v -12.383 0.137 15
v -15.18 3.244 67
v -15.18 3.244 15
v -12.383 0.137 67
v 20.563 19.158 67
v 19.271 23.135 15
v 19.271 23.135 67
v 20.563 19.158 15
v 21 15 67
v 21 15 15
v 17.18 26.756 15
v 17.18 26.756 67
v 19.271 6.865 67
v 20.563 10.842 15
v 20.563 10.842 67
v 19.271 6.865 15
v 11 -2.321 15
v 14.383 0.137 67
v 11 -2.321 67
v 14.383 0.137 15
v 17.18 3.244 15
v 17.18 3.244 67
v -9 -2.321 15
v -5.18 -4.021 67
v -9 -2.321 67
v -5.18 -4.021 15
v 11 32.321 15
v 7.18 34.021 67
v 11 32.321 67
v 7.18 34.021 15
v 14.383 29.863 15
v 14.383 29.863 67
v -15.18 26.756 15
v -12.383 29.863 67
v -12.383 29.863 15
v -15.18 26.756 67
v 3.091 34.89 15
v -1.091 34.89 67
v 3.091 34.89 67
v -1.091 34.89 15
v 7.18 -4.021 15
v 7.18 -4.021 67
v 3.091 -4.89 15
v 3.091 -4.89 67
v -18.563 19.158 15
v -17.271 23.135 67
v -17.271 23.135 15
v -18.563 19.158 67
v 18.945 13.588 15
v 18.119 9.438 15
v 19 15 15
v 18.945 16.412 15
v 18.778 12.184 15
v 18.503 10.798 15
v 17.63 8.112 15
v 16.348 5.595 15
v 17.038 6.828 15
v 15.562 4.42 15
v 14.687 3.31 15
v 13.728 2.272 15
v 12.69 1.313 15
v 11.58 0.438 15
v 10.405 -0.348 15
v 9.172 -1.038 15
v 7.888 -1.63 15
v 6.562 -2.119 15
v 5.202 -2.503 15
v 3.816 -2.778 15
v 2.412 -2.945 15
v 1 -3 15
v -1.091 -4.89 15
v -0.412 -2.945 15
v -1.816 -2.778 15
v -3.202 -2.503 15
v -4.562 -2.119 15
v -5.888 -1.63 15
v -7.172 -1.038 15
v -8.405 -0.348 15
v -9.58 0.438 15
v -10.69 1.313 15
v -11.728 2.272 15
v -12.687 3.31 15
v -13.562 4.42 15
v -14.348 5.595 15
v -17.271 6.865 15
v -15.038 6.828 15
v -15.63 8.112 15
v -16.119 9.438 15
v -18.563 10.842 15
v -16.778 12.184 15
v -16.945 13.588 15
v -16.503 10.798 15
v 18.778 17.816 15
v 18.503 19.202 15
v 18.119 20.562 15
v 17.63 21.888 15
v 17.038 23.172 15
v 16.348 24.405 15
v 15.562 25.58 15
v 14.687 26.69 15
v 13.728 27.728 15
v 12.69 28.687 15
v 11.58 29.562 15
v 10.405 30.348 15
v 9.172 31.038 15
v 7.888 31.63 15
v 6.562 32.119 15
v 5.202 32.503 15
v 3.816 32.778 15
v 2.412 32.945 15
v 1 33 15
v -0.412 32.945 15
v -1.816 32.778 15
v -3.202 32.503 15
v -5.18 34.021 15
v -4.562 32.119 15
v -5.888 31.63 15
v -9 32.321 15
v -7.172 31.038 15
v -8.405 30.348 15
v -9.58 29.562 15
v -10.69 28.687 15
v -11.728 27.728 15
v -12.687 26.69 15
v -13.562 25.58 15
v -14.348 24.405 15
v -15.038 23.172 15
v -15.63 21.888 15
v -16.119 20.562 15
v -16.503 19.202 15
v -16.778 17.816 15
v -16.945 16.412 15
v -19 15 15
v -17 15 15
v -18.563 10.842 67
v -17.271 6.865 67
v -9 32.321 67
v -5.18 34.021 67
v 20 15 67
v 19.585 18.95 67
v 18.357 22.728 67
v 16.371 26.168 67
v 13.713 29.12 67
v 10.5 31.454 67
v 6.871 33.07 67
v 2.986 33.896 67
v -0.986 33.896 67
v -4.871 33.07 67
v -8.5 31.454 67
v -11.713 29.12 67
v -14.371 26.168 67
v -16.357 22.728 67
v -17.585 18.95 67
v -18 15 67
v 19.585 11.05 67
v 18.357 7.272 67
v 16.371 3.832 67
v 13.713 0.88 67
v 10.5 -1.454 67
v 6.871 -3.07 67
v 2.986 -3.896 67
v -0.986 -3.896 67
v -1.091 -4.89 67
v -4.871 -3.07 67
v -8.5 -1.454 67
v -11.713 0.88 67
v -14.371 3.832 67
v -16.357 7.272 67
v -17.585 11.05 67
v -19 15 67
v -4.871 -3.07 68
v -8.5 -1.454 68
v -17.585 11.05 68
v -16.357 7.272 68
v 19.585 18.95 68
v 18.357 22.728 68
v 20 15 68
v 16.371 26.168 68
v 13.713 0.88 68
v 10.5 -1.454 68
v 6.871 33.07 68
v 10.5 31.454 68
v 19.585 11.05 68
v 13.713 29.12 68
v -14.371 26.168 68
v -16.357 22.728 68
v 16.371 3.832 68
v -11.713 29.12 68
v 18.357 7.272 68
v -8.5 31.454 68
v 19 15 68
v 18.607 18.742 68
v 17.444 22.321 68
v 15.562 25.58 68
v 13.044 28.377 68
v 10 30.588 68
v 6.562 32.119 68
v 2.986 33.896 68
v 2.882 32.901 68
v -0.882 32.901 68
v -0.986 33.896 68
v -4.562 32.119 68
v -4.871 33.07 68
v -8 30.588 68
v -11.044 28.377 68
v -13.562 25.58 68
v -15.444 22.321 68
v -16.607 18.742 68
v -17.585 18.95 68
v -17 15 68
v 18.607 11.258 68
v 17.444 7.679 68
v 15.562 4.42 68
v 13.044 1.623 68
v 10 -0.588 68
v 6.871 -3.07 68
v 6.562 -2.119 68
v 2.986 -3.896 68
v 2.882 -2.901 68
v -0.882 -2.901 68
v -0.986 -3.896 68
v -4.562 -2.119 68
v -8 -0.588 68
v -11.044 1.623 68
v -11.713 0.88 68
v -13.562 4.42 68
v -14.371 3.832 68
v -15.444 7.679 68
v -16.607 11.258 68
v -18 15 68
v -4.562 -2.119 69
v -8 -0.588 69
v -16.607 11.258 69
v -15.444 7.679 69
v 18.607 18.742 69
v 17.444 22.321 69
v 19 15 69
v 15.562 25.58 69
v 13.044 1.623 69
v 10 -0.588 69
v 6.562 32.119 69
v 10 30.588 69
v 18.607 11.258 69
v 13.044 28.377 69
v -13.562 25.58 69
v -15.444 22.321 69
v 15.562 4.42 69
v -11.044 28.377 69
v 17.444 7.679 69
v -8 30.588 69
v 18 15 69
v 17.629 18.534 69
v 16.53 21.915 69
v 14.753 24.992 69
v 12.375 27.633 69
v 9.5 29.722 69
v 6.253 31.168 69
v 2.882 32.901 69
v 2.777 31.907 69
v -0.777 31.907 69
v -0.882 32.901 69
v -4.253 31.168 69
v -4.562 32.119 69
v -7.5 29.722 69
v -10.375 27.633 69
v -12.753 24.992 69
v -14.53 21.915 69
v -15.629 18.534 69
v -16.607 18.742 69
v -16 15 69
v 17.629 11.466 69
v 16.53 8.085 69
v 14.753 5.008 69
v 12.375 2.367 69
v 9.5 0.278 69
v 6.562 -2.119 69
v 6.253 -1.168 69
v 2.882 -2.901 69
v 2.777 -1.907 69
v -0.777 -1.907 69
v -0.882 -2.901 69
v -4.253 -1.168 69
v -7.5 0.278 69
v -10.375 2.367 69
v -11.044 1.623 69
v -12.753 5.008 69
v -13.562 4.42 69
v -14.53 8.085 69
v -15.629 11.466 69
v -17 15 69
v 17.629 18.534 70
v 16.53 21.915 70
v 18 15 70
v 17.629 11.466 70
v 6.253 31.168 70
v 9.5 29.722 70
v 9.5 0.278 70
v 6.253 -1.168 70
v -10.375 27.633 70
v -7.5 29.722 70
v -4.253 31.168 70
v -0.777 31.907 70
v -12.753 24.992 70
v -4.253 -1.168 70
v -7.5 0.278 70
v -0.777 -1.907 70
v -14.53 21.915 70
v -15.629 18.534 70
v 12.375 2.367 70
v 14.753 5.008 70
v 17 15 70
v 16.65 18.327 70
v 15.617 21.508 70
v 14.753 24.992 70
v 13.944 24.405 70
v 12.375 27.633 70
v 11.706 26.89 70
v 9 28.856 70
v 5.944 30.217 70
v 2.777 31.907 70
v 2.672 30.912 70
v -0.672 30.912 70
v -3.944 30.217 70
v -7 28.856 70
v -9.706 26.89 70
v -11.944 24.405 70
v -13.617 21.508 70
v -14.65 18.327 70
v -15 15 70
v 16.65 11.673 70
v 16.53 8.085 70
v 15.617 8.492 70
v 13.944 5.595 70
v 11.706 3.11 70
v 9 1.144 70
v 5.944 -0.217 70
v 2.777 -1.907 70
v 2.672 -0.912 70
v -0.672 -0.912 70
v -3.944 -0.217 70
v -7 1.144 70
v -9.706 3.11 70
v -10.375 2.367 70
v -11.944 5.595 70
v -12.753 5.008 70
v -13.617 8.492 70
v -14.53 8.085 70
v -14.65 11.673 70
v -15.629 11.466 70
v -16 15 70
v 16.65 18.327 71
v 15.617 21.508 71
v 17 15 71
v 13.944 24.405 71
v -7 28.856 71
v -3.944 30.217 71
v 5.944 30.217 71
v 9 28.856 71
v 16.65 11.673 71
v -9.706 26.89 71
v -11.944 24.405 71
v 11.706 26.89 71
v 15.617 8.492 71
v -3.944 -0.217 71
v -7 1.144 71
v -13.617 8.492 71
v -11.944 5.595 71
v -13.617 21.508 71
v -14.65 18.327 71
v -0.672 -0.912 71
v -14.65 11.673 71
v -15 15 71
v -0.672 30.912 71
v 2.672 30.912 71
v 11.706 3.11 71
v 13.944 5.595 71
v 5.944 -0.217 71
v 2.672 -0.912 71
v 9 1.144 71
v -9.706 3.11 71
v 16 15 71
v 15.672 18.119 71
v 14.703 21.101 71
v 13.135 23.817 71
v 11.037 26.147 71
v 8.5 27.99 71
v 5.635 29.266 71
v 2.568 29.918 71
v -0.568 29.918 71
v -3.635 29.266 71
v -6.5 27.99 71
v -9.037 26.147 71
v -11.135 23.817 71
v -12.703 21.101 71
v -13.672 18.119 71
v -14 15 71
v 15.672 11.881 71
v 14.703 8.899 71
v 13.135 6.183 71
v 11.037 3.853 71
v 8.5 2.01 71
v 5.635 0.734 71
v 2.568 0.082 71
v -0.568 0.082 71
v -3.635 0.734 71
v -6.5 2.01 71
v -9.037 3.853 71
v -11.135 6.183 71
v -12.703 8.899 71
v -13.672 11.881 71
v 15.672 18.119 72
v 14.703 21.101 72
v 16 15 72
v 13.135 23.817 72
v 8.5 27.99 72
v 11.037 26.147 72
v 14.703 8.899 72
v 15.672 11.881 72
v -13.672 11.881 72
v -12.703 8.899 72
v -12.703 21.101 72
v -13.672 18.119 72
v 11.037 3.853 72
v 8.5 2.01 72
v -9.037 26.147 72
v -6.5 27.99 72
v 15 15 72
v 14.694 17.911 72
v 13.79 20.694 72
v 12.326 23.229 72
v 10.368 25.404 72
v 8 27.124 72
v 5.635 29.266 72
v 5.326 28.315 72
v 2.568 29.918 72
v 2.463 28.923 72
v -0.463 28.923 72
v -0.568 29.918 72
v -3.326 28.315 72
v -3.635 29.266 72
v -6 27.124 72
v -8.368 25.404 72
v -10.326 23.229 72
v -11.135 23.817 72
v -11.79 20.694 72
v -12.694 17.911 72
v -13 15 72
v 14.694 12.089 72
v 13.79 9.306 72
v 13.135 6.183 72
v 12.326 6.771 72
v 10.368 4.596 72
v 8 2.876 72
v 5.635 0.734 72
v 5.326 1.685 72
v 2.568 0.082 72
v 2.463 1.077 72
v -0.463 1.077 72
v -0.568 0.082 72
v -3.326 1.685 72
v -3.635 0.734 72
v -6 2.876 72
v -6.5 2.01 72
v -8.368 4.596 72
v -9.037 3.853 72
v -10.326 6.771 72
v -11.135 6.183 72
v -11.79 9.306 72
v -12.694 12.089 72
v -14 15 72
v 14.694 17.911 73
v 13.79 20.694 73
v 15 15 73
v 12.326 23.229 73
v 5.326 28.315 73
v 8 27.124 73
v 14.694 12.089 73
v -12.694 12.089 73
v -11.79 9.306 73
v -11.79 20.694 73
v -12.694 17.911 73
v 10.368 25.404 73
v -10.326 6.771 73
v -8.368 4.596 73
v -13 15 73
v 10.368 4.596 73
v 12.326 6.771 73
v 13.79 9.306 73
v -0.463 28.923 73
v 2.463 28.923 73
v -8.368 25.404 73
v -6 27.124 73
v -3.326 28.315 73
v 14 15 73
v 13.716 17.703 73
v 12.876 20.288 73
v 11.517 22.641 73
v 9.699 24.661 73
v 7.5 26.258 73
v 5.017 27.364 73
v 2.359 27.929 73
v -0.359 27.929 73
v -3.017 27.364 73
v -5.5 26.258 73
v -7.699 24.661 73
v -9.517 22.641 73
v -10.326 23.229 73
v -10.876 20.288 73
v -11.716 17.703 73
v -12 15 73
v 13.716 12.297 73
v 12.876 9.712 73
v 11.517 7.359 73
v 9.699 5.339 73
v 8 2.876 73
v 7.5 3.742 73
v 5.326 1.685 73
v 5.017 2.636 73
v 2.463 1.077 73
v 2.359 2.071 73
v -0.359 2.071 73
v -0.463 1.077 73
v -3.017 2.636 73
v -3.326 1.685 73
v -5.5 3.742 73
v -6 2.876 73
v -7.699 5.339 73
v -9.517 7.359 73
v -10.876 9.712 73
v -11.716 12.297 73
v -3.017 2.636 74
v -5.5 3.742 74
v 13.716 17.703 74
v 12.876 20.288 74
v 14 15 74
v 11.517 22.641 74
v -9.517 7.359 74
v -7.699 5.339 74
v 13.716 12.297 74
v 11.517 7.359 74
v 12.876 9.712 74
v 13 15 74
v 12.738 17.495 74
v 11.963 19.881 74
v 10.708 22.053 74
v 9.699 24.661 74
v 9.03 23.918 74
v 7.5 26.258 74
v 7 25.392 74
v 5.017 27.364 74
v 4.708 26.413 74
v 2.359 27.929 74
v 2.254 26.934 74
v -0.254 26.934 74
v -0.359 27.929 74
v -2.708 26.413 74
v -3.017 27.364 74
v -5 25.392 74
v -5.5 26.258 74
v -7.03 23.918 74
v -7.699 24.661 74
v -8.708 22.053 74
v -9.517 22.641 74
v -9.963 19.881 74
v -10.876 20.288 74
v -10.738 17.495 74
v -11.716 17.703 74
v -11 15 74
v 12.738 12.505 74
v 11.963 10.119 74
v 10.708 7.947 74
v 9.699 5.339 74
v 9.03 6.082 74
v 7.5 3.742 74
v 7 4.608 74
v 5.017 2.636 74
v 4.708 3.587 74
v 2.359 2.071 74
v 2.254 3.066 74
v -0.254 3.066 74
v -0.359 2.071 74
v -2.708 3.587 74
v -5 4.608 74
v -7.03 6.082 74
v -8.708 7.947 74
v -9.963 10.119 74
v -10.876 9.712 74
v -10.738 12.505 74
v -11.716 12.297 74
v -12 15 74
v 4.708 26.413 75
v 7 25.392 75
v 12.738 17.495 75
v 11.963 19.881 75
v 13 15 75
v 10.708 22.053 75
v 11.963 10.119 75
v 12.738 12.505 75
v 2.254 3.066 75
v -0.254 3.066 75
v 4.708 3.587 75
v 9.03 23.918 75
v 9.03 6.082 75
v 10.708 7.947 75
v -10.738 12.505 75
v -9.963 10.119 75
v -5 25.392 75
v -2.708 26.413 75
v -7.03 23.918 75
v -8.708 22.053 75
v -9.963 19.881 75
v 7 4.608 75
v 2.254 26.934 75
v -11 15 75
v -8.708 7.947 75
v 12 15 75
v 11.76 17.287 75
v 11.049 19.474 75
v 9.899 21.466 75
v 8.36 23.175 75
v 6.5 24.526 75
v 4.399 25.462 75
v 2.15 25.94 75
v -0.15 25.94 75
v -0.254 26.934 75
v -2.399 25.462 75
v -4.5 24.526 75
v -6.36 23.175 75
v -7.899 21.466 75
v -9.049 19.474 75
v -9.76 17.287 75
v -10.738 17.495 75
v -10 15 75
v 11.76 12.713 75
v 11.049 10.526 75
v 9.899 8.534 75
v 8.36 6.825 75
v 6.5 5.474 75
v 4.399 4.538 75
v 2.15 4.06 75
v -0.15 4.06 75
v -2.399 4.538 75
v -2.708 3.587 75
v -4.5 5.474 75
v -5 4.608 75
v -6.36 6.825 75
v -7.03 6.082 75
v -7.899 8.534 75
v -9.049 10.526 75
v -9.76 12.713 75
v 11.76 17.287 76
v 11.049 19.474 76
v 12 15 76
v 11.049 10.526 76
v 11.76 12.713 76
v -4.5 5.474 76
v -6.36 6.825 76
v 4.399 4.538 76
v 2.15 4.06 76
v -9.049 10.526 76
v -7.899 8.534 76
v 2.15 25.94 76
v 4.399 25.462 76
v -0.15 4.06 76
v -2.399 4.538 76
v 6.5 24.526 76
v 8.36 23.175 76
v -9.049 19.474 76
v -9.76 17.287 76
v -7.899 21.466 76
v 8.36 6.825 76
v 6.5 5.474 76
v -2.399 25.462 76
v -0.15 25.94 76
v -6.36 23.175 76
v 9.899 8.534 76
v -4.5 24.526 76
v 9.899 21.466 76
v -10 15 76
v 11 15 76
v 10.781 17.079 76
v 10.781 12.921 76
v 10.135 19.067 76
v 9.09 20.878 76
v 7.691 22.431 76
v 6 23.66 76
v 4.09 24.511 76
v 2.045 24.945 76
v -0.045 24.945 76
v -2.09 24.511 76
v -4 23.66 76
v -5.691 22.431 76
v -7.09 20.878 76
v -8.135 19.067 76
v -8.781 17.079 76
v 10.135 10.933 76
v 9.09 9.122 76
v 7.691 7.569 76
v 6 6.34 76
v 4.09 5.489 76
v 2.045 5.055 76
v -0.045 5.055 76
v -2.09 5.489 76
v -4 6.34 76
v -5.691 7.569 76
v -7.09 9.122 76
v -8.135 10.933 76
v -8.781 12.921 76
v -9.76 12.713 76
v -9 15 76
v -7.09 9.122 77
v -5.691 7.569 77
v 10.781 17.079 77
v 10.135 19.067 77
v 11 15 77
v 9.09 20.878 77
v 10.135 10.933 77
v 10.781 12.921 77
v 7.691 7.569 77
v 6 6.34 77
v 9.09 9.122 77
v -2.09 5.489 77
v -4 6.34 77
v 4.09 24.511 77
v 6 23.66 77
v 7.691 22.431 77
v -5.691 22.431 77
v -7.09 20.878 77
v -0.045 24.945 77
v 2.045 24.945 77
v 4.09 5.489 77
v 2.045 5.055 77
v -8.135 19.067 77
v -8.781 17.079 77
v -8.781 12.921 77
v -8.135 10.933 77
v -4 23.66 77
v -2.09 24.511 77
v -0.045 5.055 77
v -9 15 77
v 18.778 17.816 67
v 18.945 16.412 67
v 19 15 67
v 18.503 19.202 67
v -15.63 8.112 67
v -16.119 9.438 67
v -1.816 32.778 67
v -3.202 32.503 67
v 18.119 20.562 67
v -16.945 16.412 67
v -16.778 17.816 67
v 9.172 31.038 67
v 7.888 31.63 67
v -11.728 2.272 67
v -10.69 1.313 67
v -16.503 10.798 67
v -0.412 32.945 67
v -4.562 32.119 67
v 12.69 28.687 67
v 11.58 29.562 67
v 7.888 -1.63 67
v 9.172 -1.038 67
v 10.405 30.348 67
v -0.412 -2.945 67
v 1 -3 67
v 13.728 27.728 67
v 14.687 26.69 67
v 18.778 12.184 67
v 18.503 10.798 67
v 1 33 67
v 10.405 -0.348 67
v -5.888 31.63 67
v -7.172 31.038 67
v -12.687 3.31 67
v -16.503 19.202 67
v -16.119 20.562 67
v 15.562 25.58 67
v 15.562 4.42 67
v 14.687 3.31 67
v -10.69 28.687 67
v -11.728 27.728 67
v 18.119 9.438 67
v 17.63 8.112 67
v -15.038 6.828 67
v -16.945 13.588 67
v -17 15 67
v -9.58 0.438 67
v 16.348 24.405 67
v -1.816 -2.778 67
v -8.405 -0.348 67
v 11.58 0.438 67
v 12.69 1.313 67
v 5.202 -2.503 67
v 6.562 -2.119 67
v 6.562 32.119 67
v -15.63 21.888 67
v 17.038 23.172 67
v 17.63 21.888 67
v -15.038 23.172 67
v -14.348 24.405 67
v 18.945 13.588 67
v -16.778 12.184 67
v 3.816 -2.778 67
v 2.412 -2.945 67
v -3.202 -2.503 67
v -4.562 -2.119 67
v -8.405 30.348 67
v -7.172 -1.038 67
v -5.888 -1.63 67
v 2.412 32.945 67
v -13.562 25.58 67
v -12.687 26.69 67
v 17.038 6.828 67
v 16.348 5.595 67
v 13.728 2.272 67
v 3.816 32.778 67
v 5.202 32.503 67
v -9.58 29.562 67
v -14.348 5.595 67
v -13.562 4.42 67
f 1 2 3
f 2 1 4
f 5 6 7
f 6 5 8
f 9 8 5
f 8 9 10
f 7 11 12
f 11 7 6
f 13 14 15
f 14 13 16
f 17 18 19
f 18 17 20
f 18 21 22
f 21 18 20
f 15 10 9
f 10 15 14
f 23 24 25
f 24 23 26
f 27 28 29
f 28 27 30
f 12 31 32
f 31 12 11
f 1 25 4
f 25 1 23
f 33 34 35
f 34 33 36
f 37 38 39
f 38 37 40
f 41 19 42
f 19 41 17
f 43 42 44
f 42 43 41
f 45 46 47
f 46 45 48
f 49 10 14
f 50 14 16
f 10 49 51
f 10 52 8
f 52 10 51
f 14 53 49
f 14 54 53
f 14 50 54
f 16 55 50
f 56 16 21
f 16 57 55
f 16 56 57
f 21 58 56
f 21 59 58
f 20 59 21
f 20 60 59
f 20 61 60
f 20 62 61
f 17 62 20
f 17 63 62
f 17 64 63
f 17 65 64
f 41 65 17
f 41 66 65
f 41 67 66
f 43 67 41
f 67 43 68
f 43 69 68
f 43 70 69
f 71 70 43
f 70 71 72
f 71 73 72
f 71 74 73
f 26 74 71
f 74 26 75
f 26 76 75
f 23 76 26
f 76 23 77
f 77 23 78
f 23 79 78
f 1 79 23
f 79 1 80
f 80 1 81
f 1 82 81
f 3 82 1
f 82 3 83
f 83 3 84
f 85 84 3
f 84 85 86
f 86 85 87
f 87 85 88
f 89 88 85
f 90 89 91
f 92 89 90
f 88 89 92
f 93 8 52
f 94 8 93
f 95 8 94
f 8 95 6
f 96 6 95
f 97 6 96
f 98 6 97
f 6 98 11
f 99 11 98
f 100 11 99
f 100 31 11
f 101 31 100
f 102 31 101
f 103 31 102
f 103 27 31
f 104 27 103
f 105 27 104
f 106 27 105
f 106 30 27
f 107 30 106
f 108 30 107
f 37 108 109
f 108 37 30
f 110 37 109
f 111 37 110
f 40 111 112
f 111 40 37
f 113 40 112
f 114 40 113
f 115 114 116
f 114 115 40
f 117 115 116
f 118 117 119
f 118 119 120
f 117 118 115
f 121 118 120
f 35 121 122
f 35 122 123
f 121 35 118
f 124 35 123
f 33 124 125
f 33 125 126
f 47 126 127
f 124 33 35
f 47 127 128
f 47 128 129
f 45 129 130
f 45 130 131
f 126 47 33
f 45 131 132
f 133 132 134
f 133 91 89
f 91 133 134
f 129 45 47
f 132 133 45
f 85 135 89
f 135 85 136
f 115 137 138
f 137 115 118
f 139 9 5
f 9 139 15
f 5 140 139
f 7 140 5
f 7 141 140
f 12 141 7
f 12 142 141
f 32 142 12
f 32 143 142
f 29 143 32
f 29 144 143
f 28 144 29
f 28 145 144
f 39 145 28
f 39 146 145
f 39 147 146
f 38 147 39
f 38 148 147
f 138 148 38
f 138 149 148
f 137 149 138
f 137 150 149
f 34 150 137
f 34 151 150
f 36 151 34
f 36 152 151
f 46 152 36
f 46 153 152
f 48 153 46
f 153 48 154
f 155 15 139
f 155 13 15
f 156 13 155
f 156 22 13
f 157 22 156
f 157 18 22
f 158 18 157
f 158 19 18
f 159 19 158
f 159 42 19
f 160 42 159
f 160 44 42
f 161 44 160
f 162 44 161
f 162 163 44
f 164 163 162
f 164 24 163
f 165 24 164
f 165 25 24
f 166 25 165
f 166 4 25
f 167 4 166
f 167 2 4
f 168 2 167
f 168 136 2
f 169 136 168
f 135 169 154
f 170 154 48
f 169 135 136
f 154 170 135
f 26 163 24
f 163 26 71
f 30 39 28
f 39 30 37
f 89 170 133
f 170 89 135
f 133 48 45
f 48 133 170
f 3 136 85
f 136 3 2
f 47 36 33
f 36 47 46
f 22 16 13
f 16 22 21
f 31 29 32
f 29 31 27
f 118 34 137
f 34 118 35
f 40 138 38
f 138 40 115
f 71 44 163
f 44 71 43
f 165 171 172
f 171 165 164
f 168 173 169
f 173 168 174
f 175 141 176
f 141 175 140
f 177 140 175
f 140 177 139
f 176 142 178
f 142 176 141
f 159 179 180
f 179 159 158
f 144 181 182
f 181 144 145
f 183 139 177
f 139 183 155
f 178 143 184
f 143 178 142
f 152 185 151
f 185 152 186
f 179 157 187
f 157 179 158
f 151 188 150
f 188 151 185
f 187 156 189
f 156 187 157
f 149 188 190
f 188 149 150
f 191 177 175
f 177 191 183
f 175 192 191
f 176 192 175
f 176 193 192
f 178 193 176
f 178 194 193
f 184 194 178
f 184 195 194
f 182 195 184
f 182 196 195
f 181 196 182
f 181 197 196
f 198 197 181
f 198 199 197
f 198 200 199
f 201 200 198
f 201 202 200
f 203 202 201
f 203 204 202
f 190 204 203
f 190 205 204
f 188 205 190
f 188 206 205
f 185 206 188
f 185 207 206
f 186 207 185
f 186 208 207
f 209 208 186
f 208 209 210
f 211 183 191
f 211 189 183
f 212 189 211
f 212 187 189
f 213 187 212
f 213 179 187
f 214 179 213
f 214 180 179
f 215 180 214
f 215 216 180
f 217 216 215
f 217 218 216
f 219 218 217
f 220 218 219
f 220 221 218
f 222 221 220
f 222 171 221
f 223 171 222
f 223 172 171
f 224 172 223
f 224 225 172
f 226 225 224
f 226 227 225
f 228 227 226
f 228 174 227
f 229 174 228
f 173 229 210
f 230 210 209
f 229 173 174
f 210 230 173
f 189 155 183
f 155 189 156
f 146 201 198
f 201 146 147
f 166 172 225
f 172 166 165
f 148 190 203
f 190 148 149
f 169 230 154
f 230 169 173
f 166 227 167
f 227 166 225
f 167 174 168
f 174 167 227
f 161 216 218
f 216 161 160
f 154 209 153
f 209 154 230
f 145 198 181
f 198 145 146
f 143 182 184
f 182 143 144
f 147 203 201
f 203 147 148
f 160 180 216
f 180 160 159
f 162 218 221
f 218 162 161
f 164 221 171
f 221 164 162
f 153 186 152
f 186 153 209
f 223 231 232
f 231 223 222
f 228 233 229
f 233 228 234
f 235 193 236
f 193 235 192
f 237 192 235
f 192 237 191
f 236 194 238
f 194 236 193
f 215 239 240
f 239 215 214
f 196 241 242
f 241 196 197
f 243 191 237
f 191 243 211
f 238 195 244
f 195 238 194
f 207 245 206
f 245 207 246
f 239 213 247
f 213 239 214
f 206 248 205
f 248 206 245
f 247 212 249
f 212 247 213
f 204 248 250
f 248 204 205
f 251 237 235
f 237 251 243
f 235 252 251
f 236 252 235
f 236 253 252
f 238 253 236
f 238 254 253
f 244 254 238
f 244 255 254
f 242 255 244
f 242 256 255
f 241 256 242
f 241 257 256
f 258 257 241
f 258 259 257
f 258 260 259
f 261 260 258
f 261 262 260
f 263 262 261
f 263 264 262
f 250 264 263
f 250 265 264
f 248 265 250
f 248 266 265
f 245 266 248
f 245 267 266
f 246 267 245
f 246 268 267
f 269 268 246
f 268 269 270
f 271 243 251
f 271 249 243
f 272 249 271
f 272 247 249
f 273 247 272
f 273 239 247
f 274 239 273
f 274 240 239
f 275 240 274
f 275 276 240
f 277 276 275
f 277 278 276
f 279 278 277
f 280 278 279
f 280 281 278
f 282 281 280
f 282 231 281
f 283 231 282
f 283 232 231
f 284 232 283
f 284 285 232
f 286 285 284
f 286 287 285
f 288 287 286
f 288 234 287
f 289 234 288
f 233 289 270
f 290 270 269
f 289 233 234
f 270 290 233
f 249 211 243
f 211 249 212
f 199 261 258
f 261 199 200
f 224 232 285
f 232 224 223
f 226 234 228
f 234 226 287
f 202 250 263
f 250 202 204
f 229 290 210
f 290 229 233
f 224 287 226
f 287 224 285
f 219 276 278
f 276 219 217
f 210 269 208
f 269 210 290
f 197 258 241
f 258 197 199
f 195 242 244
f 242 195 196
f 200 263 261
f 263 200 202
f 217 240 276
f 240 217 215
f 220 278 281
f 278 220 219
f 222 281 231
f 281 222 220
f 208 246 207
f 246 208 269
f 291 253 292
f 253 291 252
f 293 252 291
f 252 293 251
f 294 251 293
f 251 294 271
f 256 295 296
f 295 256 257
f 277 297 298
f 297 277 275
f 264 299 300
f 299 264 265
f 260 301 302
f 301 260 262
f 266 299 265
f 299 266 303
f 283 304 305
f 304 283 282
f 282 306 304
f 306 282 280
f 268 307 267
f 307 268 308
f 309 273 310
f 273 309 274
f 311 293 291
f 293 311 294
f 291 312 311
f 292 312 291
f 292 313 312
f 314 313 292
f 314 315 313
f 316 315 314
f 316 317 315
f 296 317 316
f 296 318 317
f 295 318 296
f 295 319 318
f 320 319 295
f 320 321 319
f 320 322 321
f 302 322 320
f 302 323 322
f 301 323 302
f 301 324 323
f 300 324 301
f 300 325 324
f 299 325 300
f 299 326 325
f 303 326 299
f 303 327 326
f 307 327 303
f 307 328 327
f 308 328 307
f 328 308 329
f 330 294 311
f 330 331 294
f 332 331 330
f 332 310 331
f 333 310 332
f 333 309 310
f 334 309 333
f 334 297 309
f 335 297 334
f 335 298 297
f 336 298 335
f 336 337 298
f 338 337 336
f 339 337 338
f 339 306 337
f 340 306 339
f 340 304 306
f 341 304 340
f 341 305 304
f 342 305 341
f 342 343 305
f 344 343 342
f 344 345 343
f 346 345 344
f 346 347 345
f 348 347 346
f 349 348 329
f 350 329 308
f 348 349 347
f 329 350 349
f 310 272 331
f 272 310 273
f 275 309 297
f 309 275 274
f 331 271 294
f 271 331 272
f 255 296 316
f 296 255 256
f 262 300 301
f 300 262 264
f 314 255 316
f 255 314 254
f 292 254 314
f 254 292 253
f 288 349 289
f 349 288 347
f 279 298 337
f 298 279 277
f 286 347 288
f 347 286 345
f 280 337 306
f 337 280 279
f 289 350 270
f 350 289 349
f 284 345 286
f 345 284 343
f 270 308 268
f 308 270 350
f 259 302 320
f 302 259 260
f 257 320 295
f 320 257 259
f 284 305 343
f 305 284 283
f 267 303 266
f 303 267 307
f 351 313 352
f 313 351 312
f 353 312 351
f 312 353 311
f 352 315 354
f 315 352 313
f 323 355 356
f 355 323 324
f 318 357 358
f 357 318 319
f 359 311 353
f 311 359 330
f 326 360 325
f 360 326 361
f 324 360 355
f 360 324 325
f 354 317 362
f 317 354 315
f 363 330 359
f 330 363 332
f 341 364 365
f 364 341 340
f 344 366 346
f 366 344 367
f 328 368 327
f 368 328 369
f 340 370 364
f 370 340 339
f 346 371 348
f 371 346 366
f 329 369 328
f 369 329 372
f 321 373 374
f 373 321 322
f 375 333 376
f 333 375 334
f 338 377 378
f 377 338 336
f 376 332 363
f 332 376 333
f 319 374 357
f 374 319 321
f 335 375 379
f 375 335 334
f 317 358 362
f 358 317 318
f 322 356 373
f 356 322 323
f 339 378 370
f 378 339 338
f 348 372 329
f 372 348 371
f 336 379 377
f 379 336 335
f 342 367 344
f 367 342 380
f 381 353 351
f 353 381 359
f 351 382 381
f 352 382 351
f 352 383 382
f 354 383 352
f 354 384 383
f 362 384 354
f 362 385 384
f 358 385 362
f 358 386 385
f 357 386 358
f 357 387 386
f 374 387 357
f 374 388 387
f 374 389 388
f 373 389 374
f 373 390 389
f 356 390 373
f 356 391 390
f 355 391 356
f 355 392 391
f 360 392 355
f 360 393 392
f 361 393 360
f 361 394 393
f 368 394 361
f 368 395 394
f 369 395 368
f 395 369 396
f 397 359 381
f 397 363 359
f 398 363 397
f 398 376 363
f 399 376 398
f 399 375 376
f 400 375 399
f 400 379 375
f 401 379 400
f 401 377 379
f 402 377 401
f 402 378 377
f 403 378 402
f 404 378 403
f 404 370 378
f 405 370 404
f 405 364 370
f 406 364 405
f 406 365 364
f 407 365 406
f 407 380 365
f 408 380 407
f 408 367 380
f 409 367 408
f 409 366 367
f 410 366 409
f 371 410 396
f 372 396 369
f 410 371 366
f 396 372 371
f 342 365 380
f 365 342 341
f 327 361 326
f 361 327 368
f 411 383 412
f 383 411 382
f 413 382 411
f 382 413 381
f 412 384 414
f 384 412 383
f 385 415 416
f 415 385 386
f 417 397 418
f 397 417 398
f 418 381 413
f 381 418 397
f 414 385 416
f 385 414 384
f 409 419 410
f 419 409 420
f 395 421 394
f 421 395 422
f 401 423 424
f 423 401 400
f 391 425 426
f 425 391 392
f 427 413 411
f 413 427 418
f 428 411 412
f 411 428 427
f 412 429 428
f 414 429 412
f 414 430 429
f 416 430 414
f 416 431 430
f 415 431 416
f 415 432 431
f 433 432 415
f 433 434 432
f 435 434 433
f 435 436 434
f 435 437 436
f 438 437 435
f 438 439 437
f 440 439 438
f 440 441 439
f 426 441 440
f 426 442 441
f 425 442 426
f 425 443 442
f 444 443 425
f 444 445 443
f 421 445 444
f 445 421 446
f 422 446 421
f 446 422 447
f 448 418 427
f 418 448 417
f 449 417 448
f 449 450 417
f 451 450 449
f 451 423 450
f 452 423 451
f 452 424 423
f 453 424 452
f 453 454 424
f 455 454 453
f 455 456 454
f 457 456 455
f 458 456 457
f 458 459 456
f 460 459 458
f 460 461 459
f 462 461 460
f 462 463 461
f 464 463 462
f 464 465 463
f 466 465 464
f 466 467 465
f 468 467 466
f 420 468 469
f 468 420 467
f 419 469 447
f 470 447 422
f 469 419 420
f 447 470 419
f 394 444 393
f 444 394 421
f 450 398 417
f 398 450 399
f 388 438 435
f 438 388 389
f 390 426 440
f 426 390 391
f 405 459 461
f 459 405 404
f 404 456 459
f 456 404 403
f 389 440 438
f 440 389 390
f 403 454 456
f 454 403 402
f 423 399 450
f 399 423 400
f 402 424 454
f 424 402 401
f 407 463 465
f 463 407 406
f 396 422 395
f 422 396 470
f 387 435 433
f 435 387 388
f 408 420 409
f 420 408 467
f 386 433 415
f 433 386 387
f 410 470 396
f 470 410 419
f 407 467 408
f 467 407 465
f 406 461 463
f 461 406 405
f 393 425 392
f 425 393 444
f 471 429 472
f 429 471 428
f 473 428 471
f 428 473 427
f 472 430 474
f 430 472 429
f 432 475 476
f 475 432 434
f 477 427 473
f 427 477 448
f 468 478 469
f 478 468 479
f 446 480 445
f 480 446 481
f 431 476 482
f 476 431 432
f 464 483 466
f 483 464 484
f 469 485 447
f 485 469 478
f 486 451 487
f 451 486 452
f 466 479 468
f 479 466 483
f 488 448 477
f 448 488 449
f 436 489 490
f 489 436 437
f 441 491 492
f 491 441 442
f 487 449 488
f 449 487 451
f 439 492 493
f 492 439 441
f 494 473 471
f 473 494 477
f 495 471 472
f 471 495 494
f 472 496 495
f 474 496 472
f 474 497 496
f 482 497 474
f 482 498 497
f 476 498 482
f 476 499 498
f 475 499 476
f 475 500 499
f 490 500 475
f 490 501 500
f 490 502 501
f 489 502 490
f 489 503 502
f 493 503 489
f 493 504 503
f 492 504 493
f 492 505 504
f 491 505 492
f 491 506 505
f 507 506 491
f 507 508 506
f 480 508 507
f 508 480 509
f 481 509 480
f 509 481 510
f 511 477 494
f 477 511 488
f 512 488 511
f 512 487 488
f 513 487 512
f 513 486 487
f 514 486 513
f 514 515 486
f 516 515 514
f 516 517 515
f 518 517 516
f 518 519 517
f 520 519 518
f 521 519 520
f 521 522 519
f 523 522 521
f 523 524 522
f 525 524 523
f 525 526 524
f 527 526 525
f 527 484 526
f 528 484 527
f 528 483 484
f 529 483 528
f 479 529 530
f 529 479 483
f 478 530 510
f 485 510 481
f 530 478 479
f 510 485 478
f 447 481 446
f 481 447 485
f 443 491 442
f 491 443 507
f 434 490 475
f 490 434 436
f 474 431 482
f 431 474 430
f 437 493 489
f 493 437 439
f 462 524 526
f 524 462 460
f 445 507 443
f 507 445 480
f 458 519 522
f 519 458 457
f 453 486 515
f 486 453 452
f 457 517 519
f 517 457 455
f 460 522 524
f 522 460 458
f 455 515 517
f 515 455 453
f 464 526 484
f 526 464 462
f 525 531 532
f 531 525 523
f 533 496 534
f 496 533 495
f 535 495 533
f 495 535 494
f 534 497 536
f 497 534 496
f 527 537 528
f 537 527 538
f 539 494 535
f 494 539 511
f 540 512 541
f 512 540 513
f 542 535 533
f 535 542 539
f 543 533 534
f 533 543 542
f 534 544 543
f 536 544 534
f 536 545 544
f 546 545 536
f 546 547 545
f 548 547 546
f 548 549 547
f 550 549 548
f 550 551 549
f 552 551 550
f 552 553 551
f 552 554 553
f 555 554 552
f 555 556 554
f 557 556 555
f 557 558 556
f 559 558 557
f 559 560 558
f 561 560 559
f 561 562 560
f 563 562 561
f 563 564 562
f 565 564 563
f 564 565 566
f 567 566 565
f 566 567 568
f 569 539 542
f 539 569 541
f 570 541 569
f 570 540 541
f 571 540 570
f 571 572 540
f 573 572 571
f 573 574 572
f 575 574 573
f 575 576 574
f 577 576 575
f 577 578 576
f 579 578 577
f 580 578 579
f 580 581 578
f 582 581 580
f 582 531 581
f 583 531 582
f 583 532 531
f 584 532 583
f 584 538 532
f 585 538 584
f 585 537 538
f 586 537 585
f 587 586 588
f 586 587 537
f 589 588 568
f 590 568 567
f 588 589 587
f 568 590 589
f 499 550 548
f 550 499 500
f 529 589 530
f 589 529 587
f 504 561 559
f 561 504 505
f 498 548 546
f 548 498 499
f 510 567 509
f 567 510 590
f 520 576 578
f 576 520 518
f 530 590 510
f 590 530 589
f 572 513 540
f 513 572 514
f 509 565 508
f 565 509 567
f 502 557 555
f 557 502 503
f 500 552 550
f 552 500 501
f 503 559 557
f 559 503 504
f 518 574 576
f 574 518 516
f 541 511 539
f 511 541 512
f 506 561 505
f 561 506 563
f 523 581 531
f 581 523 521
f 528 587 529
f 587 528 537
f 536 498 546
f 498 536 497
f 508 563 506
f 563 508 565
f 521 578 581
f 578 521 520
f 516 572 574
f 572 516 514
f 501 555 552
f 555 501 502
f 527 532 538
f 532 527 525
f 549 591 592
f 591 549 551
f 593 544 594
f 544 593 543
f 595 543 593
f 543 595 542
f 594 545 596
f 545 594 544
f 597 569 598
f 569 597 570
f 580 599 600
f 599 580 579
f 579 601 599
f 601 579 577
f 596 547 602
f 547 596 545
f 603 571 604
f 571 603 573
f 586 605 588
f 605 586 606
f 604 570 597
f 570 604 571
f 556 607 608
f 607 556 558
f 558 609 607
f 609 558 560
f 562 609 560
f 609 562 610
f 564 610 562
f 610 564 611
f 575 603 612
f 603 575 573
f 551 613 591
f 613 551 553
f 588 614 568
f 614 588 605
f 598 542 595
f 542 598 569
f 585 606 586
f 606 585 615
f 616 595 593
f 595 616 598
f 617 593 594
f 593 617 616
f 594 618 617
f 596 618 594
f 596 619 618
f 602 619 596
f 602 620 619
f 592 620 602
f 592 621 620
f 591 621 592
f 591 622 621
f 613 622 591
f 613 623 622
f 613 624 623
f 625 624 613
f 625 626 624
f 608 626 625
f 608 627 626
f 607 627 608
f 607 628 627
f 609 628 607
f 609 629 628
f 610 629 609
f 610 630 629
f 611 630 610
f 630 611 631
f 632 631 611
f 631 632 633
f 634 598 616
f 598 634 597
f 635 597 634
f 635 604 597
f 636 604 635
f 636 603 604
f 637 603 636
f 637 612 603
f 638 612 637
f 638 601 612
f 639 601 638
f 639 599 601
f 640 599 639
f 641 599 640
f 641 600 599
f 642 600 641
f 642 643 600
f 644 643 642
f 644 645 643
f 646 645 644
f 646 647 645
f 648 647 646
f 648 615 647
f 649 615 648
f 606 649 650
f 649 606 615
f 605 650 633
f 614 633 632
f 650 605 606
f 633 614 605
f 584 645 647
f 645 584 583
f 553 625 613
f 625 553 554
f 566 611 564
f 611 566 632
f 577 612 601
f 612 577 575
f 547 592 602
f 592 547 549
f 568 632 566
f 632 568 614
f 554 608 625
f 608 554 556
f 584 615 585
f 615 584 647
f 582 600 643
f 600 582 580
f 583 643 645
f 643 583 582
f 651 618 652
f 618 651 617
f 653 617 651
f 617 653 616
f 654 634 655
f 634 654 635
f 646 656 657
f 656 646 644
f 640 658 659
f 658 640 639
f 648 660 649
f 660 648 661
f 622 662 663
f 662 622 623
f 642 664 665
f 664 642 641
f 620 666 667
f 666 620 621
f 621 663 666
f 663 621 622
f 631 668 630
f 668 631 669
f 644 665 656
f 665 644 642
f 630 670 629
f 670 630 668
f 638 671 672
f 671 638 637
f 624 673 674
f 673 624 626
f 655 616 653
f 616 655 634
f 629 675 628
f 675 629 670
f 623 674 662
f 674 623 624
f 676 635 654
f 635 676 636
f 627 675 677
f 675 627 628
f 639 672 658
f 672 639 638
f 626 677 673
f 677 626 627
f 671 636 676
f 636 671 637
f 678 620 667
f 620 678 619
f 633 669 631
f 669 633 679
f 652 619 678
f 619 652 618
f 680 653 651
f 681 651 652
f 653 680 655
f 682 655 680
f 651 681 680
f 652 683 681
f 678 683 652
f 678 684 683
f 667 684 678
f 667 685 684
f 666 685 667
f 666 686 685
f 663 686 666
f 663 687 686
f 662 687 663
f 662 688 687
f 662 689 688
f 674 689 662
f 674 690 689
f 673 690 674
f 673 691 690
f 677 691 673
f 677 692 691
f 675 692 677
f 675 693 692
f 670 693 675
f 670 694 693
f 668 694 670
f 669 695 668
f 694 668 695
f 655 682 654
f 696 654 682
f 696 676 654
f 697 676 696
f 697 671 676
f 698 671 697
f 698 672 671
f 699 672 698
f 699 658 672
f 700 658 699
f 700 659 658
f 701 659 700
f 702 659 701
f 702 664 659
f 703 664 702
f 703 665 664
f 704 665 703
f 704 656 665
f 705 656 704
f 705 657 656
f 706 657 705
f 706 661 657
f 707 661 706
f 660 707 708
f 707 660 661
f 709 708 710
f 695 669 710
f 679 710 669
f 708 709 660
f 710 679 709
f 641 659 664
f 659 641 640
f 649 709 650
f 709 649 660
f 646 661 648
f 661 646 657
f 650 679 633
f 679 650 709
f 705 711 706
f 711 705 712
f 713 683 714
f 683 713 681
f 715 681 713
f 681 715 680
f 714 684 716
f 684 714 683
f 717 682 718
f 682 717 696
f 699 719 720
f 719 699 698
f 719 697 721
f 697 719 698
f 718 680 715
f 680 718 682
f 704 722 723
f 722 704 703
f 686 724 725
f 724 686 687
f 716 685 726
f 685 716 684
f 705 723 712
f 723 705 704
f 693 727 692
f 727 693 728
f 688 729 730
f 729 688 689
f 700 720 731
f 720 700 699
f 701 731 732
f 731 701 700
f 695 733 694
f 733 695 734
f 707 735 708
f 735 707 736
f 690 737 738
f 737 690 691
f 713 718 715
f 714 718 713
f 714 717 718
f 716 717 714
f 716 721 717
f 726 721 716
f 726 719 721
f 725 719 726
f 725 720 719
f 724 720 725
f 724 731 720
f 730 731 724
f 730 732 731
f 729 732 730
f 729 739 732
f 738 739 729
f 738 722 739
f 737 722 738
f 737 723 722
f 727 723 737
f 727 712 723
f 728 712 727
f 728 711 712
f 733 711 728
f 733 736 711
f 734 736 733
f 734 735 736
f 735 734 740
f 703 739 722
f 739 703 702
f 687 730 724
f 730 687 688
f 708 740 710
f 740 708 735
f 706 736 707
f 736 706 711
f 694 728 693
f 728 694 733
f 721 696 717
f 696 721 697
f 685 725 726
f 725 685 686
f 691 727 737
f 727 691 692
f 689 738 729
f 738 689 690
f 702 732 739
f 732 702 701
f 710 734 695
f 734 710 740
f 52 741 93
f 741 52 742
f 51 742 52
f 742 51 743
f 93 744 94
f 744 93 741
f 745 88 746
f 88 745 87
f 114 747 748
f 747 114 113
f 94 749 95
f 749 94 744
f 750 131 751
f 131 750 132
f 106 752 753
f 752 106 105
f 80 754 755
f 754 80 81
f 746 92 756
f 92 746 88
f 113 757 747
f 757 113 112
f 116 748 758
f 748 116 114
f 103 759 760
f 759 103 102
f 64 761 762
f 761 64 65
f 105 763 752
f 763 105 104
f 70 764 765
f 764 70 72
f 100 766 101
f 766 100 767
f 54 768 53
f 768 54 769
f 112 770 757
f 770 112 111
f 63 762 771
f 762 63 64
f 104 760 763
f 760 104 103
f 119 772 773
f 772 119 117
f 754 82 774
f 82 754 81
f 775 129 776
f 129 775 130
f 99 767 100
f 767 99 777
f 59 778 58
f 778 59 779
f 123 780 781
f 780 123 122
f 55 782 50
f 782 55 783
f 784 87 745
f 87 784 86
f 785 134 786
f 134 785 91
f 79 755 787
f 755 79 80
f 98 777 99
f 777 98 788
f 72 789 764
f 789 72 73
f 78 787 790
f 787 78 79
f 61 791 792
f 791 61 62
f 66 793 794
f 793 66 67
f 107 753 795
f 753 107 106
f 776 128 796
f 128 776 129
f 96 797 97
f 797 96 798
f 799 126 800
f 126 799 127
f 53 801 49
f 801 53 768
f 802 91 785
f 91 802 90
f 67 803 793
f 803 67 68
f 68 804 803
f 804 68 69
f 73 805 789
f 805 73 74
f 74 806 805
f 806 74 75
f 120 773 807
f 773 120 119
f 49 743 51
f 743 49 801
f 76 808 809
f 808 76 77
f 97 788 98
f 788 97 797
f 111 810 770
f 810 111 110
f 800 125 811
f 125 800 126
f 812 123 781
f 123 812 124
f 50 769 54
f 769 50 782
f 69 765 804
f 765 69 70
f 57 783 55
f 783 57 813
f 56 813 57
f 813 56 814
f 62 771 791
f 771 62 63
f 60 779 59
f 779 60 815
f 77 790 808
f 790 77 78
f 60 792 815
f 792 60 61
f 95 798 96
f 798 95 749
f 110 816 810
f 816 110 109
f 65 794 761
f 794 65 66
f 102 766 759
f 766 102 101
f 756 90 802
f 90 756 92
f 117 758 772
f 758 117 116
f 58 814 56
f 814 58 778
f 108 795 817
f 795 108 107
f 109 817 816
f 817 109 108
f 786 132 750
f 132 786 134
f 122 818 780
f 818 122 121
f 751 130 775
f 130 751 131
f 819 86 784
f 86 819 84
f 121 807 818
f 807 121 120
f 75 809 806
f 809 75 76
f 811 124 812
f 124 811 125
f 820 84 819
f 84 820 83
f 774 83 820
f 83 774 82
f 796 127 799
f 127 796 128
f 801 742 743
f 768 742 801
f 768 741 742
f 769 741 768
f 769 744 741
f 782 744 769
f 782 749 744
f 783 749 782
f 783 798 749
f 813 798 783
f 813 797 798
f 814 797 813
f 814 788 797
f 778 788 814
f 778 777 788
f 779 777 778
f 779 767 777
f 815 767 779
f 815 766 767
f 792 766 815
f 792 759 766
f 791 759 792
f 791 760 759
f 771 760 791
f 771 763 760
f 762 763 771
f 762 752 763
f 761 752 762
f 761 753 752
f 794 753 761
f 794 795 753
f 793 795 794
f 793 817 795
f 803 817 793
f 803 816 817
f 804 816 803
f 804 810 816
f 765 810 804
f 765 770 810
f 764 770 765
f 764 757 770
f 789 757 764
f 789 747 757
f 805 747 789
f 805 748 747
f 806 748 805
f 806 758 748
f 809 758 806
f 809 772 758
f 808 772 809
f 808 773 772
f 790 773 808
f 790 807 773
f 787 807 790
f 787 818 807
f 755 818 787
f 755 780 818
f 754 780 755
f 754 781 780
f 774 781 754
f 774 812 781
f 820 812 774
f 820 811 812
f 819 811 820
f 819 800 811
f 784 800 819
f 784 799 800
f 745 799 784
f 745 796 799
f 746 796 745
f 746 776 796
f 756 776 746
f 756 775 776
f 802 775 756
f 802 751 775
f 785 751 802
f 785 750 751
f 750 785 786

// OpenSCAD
hight = 60;
width = 18;
size = 12;
cup (60,18,12);

module cup (hight, width, size) {
difference(){
		translate([1,15,15]) 
		for(d = [0:10]){
			translate([0,0,d ])
			cylinder(h=hight-8, r=(20-d ), fn = 30); 
		}
		translate([1,15,15])
		cylinder(h=hight-8, r=width, $fn = 80);	
	}
}
